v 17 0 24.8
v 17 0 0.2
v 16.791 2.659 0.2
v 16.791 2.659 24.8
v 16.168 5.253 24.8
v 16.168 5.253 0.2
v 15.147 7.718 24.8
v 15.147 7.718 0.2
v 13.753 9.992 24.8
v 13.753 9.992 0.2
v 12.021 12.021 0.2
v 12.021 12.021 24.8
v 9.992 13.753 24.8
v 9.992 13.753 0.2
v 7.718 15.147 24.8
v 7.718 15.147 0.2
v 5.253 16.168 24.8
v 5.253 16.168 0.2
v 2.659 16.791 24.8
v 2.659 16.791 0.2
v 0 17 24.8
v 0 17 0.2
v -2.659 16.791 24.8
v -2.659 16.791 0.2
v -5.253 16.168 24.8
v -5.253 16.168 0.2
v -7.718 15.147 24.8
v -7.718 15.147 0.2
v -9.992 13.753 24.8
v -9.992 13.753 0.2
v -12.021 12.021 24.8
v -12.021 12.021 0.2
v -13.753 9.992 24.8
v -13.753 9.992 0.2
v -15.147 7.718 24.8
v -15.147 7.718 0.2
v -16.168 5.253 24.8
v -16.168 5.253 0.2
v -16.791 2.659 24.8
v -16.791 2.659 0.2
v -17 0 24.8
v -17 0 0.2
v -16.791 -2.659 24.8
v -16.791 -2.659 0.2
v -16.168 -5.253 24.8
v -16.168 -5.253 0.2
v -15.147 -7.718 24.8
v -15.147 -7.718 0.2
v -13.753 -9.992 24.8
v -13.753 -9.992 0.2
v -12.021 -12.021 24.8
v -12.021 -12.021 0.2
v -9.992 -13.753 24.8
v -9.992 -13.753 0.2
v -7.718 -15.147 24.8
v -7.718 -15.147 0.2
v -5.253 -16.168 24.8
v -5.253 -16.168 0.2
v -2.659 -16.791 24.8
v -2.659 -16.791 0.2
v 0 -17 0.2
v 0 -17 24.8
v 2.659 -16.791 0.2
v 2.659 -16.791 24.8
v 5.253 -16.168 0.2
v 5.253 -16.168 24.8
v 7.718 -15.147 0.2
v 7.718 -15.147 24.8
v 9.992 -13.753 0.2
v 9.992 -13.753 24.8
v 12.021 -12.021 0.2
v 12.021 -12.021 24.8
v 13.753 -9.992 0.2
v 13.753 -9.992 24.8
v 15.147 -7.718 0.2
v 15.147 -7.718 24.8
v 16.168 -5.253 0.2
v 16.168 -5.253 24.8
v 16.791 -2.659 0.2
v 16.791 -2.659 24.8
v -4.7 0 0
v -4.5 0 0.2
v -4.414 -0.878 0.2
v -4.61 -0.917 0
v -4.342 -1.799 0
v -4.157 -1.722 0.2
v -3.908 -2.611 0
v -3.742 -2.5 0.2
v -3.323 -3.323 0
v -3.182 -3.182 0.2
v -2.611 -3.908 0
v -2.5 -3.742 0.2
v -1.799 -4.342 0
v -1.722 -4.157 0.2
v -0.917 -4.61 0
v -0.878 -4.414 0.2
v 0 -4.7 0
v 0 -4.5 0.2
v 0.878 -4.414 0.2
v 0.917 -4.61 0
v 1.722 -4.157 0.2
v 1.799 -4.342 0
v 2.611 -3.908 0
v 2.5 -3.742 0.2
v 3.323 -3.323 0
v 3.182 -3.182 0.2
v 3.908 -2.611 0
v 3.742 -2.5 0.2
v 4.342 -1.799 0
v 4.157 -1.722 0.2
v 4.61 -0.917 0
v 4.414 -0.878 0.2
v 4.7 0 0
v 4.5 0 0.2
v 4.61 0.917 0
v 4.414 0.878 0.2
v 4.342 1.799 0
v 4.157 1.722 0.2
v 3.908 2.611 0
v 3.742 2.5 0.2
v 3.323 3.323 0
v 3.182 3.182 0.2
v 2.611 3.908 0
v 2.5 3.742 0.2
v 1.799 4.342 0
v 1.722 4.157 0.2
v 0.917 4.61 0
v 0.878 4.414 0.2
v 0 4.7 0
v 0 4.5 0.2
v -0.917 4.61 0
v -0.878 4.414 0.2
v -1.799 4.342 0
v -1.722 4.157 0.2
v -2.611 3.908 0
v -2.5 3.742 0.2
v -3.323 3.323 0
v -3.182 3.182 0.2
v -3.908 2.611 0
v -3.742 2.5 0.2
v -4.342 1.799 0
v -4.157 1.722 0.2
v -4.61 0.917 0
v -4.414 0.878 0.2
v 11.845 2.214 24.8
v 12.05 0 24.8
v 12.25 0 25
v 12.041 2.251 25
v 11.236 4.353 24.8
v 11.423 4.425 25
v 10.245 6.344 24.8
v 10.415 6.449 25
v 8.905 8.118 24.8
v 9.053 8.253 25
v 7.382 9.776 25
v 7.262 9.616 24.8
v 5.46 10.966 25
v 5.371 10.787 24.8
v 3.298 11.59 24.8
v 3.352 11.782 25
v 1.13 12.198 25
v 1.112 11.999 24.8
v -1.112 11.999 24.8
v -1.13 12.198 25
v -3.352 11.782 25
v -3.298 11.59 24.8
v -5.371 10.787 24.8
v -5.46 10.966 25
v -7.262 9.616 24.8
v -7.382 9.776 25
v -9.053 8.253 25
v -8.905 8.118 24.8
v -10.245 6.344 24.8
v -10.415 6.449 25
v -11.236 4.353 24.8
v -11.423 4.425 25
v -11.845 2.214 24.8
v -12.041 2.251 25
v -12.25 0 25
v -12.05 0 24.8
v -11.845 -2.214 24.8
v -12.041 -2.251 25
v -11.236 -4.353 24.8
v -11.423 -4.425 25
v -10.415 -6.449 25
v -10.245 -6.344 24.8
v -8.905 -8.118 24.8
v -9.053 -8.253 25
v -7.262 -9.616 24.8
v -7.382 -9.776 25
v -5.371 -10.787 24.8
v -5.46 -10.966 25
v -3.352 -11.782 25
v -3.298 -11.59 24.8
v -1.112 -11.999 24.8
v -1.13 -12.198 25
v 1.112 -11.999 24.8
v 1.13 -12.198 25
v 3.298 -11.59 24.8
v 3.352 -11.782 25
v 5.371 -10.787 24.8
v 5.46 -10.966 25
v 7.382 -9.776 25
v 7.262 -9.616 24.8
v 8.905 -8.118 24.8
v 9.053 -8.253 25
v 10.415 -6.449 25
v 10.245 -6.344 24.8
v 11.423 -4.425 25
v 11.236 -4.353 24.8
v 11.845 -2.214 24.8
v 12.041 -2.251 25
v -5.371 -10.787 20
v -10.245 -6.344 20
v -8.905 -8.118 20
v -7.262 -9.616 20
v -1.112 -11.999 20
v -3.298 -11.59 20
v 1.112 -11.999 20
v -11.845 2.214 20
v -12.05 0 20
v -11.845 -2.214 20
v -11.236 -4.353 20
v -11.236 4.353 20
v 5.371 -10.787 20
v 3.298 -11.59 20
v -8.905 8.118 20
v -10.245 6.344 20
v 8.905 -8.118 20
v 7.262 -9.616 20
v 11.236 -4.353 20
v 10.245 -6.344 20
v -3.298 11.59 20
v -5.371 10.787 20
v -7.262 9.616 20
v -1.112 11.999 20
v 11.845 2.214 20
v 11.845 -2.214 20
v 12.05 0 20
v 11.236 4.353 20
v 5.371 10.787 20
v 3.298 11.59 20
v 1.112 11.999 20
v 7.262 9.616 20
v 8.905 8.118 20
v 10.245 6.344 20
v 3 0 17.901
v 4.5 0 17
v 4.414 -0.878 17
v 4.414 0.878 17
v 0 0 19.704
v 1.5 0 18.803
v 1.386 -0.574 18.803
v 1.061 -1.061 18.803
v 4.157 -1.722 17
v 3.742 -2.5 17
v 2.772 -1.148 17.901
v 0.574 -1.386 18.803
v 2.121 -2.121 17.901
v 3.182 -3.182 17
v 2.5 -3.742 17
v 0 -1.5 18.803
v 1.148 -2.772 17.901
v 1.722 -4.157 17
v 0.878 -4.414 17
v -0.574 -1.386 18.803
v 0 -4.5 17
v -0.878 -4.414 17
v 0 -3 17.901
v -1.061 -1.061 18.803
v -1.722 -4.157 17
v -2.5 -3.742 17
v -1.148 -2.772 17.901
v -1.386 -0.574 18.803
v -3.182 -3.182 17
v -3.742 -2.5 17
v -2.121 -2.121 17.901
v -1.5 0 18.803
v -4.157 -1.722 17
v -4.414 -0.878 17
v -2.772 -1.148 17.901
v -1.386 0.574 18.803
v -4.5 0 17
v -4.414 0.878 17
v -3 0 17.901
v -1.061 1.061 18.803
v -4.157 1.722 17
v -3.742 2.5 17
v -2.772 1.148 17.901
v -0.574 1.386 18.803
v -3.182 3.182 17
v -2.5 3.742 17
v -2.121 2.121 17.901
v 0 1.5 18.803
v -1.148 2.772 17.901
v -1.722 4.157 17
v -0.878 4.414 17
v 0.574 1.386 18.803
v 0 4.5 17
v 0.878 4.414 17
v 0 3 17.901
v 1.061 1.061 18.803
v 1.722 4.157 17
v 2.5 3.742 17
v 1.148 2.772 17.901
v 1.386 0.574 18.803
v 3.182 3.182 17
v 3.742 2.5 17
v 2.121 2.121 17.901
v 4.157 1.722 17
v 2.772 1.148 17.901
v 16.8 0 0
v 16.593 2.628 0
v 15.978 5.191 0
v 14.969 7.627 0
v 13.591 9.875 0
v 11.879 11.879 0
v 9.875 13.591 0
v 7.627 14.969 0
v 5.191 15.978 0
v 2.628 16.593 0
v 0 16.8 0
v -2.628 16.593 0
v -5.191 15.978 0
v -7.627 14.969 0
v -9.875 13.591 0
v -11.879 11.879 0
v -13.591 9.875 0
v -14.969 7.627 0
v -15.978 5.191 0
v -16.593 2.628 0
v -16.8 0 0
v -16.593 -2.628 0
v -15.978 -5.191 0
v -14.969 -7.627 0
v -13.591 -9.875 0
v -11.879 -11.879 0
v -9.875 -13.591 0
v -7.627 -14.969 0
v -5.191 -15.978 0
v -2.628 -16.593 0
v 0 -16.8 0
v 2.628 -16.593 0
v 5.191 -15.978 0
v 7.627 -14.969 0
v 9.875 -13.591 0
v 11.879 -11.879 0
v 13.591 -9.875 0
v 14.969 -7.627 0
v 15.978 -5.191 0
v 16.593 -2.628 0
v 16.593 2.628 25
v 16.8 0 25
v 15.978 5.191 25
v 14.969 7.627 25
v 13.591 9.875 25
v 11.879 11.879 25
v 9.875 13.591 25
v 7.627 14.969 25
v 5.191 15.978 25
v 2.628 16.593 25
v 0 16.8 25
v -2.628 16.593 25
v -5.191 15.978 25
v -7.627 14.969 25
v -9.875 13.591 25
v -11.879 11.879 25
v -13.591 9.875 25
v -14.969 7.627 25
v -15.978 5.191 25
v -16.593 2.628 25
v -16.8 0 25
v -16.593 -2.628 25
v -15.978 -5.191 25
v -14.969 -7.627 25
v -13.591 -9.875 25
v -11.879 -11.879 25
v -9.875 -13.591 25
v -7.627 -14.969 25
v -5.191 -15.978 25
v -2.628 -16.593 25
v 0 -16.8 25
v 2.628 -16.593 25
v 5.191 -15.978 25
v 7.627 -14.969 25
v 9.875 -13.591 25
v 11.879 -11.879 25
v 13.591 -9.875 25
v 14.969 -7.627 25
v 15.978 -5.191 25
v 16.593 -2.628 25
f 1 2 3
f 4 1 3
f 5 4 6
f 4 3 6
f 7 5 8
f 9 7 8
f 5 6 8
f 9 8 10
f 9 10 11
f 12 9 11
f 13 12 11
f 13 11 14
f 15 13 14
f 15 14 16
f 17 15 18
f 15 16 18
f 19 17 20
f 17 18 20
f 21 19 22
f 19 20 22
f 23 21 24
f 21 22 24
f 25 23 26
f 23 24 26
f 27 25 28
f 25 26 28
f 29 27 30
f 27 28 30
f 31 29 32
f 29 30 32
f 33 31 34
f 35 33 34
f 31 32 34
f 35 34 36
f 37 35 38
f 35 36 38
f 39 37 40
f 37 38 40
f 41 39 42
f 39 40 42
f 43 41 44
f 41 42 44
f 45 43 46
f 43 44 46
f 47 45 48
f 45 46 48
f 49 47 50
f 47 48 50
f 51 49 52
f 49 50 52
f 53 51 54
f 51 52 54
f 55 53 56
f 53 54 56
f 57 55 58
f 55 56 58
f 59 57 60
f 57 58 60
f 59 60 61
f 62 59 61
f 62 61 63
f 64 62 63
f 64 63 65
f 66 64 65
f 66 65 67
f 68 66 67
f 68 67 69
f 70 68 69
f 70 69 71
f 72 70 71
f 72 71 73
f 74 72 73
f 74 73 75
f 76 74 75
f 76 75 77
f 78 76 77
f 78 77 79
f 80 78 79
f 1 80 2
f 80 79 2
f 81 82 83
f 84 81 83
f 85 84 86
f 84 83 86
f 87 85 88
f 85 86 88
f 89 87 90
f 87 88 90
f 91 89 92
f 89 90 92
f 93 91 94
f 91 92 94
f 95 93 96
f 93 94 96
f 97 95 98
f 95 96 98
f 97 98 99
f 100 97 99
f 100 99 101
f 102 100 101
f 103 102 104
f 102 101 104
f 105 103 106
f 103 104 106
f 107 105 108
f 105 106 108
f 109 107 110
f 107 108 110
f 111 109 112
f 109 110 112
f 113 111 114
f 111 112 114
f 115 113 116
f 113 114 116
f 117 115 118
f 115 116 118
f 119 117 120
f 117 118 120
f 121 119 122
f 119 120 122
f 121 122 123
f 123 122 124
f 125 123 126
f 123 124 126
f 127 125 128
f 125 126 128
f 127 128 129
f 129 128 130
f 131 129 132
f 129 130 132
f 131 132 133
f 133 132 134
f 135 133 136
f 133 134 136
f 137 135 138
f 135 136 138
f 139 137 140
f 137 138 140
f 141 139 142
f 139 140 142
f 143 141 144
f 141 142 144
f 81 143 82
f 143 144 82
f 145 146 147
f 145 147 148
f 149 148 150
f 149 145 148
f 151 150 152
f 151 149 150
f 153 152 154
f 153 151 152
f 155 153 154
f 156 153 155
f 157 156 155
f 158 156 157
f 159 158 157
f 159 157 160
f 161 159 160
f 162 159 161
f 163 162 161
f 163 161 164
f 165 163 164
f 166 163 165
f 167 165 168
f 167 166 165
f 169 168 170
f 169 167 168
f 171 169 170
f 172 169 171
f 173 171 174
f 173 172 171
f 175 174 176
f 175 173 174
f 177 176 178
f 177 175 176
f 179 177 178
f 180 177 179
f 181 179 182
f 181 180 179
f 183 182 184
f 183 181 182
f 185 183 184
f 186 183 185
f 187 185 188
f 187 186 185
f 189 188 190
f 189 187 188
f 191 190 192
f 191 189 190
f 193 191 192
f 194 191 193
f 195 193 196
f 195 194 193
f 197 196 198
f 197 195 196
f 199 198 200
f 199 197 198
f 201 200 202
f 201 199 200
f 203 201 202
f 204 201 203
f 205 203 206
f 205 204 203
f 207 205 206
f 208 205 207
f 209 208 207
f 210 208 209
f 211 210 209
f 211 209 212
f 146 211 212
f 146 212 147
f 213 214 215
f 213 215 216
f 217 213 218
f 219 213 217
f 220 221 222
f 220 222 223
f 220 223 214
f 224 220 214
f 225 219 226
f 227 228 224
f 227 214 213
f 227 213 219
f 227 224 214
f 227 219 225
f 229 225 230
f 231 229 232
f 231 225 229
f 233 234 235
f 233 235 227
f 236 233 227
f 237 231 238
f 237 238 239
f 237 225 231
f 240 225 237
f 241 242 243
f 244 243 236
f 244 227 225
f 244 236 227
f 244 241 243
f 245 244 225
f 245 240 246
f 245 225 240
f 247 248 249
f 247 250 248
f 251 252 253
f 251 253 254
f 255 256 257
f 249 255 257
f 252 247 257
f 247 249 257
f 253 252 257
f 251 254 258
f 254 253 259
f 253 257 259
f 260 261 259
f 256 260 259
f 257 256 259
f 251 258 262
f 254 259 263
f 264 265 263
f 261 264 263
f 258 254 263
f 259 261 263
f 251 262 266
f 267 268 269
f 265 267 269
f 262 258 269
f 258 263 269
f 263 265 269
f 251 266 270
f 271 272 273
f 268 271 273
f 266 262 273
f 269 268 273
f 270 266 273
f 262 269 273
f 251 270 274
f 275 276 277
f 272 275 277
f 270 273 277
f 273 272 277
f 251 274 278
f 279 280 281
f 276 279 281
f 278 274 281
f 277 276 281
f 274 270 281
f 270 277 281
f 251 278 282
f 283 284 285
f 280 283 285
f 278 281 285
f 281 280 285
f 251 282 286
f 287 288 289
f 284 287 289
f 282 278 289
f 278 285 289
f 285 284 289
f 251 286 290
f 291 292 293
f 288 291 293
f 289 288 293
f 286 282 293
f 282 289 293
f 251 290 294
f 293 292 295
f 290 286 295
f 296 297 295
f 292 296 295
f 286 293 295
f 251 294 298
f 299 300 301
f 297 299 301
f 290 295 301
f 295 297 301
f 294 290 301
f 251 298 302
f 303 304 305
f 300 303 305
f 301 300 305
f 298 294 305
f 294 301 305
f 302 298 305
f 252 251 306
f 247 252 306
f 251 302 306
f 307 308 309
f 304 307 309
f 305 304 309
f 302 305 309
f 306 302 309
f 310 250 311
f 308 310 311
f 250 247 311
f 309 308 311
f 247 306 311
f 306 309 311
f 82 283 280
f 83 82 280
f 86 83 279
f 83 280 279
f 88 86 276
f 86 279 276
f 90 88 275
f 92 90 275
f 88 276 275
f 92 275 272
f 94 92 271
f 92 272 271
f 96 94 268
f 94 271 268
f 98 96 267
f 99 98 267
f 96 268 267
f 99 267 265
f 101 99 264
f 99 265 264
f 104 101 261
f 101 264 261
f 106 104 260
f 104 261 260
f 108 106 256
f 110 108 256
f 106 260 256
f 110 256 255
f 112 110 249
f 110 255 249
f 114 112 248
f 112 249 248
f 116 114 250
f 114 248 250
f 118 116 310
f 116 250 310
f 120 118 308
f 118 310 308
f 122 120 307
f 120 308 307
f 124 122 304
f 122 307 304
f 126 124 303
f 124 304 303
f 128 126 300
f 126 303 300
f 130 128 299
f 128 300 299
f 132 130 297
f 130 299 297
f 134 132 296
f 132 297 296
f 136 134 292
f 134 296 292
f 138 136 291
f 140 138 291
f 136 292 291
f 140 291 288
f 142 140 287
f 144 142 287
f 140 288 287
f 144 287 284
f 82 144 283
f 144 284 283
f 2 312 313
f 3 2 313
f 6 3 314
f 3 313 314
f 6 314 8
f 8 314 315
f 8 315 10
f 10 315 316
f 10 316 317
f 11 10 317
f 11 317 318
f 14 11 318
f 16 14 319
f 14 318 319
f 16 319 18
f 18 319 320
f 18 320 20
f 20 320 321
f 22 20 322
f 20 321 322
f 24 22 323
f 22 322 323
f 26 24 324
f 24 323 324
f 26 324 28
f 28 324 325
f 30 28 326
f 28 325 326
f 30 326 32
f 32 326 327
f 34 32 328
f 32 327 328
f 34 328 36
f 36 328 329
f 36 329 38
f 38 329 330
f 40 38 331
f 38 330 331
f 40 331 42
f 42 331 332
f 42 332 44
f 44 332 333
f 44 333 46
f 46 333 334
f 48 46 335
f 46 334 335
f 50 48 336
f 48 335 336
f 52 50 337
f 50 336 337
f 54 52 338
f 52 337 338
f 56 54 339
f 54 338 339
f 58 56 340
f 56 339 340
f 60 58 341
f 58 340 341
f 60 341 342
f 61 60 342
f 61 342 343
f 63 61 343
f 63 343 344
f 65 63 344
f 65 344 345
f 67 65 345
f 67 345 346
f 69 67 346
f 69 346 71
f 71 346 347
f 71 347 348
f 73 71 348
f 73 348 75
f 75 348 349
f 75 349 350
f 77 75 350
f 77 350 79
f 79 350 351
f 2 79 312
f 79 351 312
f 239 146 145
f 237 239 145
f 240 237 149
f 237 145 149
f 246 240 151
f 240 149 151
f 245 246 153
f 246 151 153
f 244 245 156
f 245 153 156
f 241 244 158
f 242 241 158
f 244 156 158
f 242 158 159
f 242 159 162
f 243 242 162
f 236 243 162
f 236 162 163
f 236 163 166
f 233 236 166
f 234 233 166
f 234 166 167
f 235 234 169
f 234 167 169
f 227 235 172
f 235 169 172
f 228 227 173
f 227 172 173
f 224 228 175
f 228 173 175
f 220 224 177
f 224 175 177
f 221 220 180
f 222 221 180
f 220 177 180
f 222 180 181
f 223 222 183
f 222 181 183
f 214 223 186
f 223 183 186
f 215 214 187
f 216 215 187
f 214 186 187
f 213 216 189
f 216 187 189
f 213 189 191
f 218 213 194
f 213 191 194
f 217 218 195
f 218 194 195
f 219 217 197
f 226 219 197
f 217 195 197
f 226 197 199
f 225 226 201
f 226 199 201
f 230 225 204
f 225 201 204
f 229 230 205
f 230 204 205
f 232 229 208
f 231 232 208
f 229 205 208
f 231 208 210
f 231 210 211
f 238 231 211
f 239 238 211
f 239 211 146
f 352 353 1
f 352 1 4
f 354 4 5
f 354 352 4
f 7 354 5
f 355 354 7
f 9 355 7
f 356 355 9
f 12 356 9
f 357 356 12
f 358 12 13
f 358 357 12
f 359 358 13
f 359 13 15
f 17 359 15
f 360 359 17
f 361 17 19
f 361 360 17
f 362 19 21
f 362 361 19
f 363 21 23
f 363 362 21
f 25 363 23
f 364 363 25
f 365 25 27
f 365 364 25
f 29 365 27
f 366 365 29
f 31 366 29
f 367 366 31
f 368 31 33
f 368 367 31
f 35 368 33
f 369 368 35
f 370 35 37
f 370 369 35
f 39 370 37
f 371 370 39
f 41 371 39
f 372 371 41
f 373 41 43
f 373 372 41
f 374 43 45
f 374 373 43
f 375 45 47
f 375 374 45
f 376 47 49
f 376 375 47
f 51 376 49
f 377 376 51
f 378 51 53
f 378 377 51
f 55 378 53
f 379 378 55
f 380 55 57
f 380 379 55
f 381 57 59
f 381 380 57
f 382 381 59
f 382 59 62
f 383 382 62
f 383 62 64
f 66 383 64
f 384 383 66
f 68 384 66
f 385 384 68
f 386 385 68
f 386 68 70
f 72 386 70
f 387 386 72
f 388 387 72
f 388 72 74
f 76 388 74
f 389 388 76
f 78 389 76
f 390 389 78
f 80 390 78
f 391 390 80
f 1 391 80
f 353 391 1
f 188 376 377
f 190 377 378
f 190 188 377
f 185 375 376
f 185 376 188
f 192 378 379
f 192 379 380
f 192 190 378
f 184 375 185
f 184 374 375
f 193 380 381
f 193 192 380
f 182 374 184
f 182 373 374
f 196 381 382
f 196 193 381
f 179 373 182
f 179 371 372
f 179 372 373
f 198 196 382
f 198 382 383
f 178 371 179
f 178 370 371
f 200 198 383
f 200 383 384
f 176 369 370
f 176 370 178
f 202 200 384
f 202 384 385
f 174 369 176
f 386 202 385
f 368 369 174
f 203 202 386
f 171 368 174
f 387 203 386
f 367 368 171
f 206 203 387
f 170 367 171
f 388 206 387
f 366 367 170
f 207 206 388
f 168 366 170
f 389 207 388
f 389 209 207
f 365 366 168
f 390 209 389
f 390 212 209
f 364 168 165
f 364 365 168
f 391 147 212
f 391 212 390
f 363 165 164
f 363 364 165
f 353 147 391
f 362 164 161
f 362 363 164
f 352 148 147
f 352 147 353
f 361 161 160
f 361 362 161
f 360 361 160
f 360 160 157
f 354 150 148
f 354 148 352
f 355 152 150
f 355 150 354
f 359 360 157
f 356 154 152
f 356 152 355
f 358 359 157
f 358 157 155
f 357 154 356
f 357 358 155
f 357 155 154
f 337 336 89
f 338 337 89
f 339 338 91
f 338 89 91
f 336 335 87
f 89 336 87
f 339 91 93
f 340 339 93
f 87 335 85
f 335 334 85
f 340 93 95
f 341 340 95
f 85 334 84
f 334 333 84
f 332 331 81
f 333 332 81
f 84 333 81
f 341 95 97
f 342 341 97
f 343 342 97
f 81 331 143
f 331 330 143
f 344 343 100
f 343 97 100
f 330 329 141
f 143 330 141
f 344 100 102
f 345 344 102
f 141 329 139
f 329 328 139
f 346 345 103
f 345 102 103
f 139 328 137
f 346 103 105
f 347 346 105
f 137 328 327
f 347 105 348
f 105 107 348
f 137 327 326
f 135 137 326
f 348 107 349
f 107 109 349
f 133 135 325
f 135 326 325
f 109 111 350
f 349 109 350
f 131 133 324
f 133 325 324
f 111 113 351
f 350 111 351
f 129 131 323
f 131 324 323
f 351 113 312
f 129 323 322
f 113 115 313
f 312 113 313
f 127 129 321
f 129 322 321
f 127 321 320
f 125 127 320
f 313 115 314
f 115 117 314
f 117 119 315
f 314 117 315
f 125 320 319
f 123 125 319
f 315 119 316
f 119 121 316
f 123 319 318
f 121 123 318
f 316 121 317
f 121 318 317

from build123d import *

# Parameters (mm, degrees)
F0_R     = 17
F1_DEPTH = 25
F3_D     = 9
F3_DEPTH = 17
F3_TIP   = 2.7038727856
F4_R     = 12.05
F5_DEPTH = 5
F6_SIZE  = 0.2


with BuildPart() as f1:
    # F0 (on Top) → F1 (new body)
    with BuildSketch(Plane.XY):
        Circle(F0_R)
    extrude(amount=F1_DEPTH)

    # F3
    with Locations(Plane(origin=(0, 0, 0), x_dir=(1, 0, 0), z_dir=(0, 0, -1))):
        with Locations((0, 0)):
            Hole(F3_D / 2, depth=F3_DEPTH)
            with Locations((0, 0, -(F3_DEPTH + F3_TIP / 2))):  # 118° drill point
                Cone(0, F3_D / 2, F3_TIP, mode=Mode.SUBTRACT)

    # F4 (on face) → F5 (cut)
    with BuildSketch(Plane.XY.offset(25)):
        Circle(F4_R)
    extrude(amount=-F5_DEPTH, mode=Mode.SUBTRACT)

    # F6
    f6_edges = [f1.edges().sort_by_distance(p)[0] for p in [
        (-17, 0, 25),
        (-12.05, 0, 25),
        (-17, 0, 0),
        (-4.5, 0, 0),
    ]]
    chamfer(f6_edges, length=F6_SIZE)


solid = f1.part
